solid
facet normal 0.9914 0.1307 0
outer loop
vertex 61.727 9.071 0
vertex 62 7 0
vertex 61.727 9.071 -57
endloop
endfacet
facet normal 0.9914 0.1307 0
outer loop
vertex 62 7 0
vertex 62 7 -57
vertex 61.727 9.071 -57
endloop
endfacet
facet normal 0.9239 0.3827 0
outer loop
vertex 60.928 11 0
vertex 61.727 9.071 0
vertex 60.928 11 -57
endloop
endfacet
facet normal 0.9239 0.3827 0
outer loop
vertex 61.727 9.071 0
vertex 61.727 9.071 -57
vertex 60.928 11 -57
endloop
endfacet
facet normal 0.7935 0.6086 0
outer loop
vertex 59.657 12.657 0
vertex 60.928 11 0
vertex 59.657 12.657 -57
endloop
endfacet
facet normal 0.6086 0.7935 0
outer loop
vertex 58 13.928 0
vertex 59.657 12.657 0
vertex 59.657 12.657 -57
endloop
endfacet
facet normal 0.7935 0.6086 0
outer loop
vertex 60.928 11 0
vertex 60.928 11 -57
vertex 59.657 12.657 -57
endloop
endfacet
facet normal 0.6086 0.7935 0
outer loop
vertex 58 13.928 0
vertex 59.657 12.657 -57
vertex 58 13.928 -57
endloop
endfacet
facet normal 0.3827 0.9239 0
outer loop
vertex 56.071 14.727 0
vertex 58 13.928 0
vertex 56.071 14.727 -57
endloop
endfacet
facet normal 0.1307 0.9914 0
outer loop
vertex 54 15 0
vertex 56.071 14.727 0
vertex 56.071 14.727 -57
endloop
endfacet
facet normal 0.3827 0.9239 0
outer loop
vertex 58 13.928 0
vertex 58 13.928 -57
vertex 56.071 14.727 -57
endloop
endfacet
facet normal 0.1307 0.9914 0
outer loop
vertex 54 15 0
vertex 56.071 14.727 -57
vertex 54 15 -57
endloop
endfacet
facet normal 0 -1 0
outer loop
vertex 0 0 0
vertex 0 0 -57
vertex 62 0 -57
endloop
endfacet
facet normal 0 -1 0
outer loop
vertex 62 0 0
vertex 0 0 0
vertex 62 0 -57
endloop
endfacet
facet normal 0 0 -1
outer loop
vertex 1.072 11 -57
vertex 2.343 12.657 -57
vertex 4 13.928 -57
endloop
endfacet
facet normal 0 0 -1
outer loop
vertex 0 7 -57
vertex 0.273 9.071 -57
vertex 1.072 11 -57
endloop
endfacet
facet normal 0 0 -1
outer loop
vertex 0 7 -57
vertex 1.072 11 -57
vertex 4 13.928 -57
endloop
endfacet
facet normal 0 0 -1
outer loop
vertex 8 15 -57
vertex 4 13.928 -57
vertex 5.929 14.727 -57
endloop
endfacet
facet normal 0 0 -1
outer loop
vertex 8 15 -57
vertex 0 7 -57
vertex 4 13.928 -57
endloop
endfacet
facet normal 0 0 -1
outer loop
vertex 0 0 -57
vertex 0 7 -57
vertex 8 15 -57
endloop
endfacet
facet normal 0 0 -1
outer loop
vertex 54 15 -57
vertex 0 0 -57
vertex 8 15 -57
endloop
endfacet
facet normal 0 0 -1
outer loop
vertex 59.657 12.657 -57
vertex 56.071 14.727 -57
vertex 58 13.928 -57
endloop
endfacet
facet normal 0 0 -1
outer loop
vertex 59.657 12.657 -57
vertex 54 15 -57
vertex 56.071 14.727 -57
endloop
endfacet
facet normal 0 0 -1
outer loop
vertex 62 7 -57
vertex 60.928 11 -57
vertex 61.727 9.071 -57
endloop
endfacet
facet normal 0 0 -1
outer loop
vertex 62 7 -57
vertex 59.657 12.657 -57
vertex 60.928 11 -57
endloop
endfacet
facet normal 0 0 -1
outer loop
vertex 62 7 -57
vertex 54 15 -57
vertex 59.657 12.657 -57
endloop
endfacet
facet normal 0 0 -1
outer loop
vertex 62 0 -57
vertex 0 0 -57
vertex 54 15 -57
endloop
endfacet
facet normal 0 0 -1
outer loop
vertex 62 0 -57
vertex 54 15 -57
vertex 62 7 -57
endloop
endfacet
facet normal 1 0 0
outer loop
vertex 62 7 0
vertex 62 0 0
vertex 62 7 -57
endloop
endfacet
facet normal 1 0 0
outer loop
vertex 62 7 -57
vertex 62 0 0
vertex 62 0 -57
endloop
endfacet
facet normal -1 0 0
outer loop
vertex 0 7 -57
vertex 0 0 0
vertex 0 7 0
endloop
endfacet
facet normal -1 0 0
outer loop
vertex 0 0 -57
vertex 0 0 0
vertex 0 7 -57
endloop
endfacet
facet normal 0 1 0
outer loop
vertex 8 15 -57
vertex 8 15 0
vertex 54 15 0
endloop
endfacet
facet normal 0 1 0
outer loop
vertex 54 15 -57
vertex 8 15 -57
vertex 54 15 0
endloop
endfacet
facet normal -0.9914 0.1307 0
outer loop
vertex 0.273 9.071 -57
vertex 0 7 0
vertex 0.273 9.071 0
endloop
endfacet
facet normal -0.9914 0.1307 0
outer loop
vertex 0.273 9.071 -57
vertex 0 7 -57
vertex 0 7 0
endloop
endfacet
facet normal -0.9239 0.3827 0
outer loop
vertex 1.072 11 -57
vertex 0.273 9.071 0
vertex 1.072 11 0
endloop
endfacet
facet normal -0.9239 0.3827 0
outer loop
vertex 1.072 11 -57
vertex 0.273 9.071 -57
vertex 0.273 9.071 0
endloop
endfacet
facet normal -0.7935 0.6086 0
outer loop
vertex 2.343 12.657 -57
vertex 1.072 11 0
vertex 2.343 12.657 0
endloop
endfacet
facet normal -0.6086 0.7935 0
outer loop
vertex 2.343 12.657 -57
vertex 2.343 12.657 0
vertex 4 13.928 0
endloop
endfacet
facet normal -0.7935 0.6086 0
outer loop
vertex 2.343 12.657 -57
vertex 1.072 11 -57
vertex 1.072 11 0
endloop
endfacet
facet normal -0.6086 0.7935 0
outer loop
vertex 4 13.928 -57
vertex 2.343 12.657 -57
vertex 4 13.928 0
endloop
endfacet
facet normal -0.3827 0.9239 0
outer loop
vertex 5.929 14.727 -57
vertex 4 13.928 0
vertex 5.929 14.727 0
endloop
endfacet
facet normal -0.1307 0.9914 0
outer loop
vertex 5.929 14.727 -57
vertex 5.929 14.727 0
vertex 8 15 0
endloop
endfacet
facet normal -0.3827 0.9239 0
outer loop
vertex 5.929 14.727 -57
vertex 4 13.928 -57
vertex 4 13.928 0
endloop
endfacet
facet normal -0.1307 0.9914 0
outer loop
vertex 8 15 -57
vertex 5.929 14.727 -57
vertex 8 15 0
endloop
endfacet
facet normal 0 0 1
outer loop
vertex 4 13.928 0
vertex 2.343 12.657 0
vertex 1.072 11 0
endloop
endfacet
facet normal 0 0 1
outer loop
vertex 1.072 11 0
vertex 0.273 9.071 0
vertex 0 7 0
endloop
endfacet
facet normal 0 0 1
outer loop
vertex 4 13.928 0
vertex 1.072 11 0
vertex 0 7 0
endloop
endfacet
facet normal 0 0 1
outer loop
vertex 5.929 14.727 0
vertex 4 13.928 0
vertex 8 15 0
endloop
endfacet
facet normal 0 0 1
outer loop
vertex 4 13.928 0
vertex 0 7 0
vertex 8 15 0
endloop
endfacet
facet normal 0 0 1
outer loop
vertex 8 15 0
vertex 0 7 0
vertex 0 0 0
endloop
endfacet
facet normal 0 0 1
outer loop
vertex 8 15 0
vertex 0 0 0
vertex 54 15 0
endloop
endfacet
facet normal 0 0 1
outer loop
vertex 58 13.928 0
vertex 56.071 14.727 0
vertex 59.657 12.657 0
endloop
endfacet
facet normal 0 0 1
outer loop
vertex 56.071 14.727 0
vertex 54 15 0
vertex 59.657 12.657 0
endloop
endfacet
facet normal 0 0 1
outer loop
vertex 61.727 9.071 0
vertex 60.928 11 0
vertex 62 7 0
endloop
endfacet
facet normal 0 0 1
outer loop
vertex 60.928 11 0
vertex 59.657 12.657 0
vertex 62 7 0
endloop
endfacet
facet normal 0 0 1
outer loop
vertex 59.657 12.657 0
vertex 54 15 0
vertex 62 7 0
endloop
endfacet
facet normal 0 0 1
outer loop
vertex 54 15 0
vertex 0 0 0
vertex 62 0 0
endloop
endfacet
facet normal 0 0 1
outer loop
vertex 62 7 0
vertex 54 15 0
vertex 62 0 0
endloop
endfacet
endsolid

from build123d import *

# Parameters (mm, degrees)
SKETCH1_W           = 62
SKETCH1_H           = 57
BOSS_EXTRUDE1_DEPTH = 15
FILLET1_R           = 8


with BuildPart() as part:
    # Sketch1 → Boss-Extrude1 (new body)
    with BuildSketch(Plane(origin=(0, 0, 0), x_dir=(1, 0, 0), z_dir=(0, 1, 0))):
        with Locations((31, 28.5)):
            Rectangle(SKETCH1_W, SKETCH1_H)
    extrude(amount=BOSS_EXTRUDE1_DEPTH)

    # Fillet1
    fillet1_edges = [part.edges().sort_by_distance(p)[0] for p in [
        (62, 15, -28.5),
        (0, 15, -28.5),
    ]]
    fillet(fillet1_edges, radius=FILLET1_R)


solid = part.part
